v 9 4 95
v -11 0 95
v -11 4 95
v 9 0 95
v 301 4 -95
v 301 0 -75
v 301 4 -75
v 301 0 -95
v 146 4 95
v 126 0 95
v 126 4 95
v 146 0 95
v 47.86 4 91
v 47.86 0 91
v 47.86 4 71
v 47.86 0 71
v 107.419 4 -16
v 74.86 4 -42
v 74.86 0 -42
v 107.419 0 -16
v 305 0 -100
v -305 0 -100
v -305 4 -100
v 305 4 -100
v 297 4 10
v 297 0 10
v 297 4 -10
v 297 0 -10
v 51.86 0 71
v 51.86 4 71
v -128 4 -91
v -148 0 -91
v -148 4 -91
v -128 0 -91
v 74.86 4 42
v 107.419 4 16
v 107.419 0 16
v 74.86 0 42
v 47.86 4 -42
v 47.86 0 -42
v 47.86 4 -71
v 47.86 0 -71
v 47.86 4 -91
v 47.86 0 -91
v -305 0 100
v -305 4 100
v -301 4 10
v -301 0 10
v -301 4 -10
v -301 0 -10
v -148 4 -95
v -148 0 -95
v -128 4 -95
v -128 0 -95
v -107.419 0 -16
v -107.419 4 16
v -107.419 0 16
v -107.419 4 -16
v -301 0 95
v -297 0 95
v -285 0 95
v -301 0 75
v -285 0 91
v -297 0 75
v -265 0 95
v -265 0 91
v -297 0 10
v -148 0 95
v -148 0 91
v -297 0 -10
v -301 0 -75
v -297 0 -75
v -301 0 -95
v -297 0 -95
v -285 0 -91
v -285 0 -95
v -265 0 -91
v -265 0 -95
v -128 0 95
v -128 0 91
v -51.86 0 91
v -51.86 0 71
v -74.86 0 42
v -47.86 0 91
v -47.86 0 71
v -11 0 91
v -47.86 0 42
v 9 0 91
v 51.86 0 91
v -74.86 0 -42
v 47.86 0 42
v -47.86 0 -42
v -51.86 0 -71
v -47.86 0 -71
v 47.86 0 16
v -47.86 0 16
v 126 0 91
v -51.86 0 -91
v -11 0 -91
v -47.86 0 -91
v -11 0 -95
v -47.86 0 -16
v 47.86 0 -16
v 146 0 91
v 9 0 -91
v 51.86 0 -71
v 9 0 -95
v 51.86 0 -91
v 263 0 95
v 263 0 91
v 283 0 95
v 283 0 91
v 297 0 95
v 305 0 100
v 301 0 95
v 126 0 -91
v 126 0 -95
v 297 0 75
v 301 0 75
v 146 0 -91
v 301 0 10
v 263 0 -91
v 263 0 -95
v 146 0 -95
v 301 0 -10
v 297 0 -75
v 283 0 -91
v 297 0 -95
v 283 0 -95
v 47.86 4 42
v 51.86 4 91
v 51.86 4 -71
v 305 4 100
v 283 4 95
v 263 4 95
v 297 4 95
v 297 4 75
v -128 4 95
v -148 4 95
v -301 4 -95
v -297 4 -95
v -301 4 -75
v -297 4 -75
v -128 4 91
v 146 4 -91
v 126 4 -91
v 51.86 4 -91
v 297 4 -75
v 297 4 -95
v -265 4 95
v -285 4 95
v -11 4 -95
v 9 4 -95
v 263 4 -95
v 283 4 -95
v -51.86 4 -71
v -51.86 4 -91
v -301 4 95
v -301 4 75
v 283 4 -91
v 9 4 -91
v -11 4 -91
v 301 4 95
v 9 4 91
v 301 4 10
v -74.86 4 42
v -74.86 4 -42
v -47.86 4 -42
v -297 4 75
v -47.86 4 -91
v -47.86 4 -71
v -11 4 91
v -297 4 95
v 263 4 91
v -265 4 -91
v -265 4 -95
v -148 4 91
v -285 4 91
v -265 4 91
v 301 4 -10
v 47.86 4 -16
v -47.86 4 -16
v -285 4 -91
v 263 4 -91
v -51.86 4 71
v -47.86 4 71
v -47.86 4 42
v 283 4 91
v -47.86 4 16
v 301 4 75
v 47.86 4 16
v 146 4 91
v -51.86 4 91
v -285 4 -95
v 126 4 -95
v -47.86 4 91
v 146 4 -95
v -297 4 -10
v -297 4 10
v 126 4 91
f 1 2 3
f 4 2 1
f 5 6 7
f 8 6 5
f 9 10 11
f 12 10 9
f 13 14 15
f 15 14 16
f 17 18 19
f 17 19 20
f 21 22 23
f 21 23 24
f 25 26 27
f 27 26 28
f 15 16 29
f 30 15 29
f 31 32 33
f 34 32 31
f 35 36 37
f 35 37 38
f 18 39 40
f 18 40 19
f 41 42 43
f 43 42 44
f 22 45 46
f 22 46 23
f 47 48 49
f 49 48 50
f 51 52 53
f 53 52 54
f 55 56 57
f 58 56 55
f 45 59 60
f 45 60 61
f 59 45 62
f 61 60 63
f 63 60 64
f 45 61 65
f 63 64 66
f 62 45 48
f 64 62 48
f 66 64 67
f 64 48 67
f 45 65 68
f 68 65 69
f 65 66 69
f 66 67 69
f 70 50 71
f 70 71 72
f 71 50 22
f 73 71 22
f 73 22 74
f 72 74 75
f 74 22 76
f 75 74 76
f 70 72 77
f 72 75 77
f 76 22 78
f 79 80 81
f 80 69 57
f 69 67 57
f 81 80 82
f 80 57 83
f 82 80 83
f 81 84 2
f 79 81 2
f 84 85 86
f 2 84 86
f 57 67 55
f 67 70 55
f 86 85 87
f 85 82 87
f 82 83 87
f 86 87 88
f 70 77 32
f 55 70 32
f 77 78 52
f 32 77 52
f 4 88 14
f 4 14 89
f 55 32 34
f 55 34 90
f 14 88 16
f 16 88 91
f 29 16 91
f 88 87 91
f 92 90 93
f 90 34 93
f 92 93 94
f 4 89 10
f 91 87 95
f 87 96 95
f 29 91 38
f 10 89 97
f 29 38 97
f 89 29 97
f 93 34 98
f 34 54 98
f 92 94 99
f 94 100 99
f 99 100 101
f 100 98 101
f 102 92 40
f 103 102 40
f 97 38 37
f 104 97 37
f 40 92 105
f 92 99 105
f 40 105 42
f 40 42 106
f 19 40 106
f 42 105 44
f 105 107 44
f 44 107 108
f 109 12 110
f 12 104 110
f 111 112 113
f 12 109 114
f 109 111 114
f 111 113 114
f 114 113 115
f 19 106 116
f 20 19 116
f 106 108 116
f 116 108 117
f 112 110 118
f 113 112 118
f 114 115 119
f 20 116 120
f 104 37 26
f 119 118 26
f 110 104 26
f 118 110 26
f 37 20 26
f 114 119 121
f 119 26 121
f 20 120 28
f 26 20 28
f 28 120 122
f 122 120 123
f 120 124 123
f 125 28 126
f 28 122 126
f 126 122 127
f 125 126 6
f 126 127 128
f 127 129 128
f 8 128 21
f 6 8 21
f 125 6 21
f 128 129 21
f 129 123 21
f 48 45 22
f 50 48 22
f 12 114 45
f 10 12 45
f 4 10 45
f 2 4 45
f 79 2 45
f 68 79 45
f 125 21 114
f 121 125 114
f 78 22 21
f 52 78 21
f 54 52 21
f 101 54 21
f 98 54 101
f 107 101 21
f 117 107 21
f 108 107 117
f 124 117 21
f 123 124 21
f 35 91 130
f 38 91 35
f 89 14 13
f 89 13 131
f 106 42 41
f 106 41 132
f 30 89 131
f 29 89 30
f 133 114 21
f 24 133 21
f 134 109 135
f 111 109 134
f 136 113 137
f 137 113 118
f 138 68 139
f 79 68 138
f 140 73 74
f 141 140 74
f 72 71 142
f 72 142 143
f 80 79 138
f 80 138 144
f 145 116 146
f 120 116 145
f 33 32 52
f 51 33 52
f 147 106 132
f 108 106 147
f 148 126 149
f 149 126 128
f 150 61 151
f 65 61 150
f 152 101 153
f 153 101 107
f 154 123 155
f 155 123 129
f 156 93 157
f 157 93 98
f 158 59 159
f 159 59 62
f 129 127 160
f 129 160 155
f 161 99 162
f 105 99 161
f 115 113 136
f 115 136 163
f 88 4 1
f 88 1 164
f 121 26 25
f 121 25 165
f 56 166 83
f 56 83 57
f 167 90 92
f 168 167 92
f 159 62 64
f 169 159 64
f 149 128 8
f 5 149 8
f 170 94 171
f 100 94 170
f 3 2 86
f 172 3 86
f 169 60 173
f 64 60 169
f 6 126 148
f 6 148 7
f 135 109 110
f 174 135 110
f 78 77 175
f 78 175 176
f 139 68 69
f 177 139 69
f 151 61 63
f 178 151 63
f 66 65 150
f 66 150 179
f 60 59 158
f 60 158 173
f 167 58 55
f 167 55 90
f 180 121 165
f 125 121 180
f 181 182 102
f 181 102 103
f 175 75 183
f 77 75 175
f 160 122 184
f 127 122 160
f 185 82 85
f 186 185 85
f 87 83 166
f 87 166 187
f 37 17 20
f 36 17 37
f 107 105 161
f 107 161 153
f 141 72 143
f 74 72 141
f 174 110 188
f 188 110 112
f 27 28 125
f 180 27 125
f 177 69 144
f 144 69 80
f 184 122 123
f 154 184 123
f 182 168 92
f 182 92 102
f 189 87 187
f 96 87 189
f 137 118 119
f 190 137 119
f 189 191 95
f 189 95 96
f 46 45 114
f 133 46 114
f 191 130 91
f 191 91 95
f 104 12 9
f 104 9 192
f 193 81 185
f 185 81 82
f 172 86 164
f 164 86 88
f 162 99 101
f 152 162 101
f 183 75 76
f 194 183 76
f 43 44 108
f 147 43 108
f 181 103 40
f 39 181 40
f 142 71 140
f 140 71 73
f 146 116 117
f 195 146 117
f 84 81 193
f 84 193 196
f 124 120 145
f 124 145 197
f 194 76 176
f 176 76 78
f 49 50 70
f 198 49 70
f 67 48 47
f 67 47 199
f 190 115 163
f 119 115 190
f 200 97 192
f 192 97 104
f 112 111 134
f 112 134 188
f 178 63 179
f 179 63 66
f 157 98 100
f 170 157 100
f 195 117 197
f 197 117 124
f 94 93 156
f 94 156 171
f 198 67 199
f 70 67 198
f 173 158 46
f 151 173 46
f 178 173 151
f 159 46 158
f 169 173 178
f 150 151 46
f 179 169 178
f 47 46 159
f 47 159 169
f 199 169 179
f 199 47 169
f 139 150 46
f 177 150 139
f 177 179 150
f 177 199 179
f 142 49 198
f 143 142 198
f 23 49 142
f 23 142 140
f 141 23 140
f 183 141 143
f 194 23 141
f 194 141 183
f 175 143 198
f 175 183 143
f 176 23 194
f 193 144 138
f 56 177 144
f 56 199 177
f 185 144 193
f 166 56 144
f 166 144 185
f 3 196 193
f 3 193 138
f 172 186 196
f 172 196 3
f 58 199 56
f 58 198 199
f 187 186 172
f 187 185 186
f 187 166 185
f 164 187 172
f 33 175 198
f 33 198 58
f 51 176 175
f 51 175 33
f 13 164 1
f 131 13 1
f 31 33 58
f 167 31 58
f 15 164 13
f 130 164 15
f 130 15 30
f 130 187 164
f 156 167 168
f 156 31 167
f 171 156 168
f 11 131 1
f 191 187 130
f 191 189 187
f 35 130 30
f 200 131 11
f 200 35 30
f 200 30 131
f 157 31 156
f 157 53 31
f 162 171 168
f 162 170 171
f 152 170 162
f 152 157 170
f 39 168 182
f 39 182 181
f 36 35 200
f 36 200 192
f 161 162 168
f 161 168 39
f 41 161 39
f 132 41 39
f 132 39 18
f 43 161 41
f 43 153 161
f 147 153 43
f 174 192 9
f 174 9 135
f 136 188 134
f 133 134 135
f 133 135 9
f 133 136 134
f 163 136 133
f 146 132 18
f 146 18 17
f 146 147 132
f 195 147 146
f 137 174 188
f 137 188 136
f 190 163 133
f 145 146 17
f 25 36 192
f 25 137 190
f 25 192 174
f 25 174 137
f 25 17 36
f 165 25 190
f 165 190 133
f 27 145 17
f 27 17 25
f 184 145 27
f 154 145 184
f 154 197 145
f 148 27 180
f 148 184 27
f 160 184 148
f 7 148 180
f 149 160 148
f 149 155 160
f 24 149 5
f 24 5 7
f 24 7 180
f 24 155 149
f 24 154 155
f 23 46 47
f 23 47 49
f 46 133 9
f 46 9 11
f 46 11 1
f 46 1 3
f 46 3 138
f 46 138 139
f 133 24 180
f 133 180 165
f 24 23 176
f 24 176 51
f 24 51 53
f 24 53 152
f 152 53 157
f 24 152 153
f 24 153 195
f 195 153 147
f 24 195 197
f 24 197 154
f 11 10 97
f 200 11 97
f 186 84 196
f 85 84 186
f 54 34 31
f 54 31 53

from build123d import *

# Parameters (mm, degrees)
SKETCH1_W           = 610
SKETCH1_H           = 200
SKETCH1_W_2         = 4
SKETCH1_H_2         = 20
SKETCH1_W_3         = 20
SKETCH1_H_3         = 4
BOSS_EXTRUDE1_DEPTH = 4
CUT_EXTRUDE1_DEPTH  = 10


with BuildPart() as part:
    # Sketch1 → Boss-Extrude1 (new body)
    with BuildSketch(Plane(origin=(0, 0, 0), x_dir=(1, 0, 0), z_dir=(0, 1, 0))):
        Rectangle(SKETCH1_W, SKETCH1_H)
        with Locations((-299, -85)):
            Rectangle(SKETCH1_W_2, SKETCH1_H_2, mode=Mode.SUBTRACT)
        with Locations((-299, 85)):
            Rectangle(SKETCH1_W_2, SKETCH1_H_2, mode=Mode.SUBTRACT)
        with Locations((-299, 0)):
            Rectangle(SKETCH1_W_2, SKETCH1_H_2, mode=Mode.SUBTRACT)
        with Locations((-275, 93)):
            Rectangle(SKETCH1_W_3, SKETCH1_H_3, mode=Mode.SUBTRACT)
        with Locations((-138, 93)):
            Rectangle(SKETCH1_W_3, SKETCH1_H_3, mode=Mode.SUBTRACT)
        with Locations((-1, 93)):
            Rectangle(SKETCH1_W_3, SKETCH1_H_3, mode=Mode.SUBTRACT)
        with Locations((-1, -93)):
            Rectangle(SKETCH1_W_3, SKETCH1_H_3, mode=Mode.SUBTRACT)
        with Locations((-138, -93)):
            Rectangle(SKETCH1_W_3, SKETCH1_H_3, mode=Mode.SUBTRACT)
        with Locations((-275, -93)):
            Rectangle(SKETCH1_W_3, SKETCH1_H_3, mode=Mode.SUBTRACT)
        with Locations((-49.859697176, -81)):
            Rectangle(SKETCH1_W_2, SKETCH1_H_2, mode=Mode.SUBTRACT)
        with Locations((-49.859697176, -32)):
            Rectangle(SKETCH1_W_2, SKETCH1_H_2, mode=Mode.SUBTRACT)
        with Locations((-64.859697176, -14)):
            Rectangle(SKETCH1_W_3, SKETCH1_H_3, mode=Mode.SUBTRACT)
        with Locations((-64.859697176, 14)):
            Rectangle(SKETCH1_W_3, SKETCH1_H_3, mode=Mode.SUBTRACT)
        with Locations((-49.859697176, 32)):
            Rectangle(SKETCH1_W_2, SKETCH1_H_2, mode=Mode.SUBTRACT)
        with Locations((0, -14)):
            Rectangle(SKETCH1_W_3, SKETCH1_H_3, mode=Mode.SUBTRACT)
        with Locations((0.140302824, 14)):
            Rectangle(SKETCH1_W_3, SKETCH1_H_3, mode=Mode.SUBTRACT)
        with Locations((136, 93)):
            Rectangle(SKETCH1_W_3, SKETCH1_H_3, mode=Mode.SUBTRACT)
        with Locations((273, 93)):
            Rectangle(SKETCH1_W_3, SKETCH1_H_3, mode=Mode.SUBTRACT)
        with Locations((49.859697176, -81)):
            Rectangle(SKETCH1_W_2, SKETCH1_H_2, mode=Mode.SUBTRACT)
        with Locations((49.859697176, -32)):
            Rectangle(SKETCH1_W_2, SKETCH1_H_2, mode=Mode.SUBTRACT)
        with Locations((64.859697176, -14)):
            Rectangle(SKETCH1_W_3, SKETCH1_H_3, mode=Mode.SUBTRACT)
        with Locations((64.859697176, 14)):
            Rectangle(SKETCH1_W_3, SKETCH1_H_3, mode=Mode.SUBTRACT)
        with Locations((49.859697176, 32)):
            Rectangle(SKETCH1_W_2, SKETCH1_H_2, mode=Mode.SUBTRACT)
        with Locations((273, -93)):
            Rectangle(SKETCH1_W_3, SKETCH1_H_3, mode=Mode.SUBTRACT)
        with Locations((136, -93)):
            Rectangle(SKETCH1_W_3, SKETCH1_H_3, mode=Mode.SUBTRACT)
        with Locations((49.859697176, 81)):
            Rectangle(SKETCH1_W_2, SKETCH1_H_2, mode=Mode.SUBTRACT)
        with Locations((-49.859697176, 81)):
            Rectangle(SKETCH1_W_2, SKETCH1_H_2, mode=Mode.SUBTRACT)
        with Locations((299, 85)):
            Rectangle(SKETCH1_W_2, SKETCH1_H_2, mode=Mode.SUBTRACT)
        with Locations((299, 0)):
            Rectangle(SKETCH1_W_2, SKETCH1_H_2, mode=Mode.SUBTRACT)
        with Locations((299, -85)):
            Rectangle(SKETCH1_W_2, SKETCH1_H_2, mode=Mode.SUBTRACT)
    extrude(amount=BOSS_EXTRUDE1_DEPTH)

    # Sketch2 → Cut-Extrude1 (cut)
    with BuildSketch(Plane(origin=(0, 4, 0), x_dir=(1, 0, 0), z_dir=(0, 1, 0))):
        Polygon((-47.859697176, 16), (47.859697176, 16), (47.859697176, 42), (74.859697176, 42), (107.419236847, 16), (107.419236847, -16), (74.859697176, -42), (47.859697176, -42), (47.859697176, -16), (-47.859697176, -16), (-47.859697176, -42), (-74.859697176, -42), (-107.419236847, -16), (-107.419236847, 16), (-74.859697176, 42), (-47.859697176, 42), align=None)
    extrude(amount=-CUT_EXTRUDE1_DEPTH, mode=Mode.SUBTRACT)


solid = part.part
